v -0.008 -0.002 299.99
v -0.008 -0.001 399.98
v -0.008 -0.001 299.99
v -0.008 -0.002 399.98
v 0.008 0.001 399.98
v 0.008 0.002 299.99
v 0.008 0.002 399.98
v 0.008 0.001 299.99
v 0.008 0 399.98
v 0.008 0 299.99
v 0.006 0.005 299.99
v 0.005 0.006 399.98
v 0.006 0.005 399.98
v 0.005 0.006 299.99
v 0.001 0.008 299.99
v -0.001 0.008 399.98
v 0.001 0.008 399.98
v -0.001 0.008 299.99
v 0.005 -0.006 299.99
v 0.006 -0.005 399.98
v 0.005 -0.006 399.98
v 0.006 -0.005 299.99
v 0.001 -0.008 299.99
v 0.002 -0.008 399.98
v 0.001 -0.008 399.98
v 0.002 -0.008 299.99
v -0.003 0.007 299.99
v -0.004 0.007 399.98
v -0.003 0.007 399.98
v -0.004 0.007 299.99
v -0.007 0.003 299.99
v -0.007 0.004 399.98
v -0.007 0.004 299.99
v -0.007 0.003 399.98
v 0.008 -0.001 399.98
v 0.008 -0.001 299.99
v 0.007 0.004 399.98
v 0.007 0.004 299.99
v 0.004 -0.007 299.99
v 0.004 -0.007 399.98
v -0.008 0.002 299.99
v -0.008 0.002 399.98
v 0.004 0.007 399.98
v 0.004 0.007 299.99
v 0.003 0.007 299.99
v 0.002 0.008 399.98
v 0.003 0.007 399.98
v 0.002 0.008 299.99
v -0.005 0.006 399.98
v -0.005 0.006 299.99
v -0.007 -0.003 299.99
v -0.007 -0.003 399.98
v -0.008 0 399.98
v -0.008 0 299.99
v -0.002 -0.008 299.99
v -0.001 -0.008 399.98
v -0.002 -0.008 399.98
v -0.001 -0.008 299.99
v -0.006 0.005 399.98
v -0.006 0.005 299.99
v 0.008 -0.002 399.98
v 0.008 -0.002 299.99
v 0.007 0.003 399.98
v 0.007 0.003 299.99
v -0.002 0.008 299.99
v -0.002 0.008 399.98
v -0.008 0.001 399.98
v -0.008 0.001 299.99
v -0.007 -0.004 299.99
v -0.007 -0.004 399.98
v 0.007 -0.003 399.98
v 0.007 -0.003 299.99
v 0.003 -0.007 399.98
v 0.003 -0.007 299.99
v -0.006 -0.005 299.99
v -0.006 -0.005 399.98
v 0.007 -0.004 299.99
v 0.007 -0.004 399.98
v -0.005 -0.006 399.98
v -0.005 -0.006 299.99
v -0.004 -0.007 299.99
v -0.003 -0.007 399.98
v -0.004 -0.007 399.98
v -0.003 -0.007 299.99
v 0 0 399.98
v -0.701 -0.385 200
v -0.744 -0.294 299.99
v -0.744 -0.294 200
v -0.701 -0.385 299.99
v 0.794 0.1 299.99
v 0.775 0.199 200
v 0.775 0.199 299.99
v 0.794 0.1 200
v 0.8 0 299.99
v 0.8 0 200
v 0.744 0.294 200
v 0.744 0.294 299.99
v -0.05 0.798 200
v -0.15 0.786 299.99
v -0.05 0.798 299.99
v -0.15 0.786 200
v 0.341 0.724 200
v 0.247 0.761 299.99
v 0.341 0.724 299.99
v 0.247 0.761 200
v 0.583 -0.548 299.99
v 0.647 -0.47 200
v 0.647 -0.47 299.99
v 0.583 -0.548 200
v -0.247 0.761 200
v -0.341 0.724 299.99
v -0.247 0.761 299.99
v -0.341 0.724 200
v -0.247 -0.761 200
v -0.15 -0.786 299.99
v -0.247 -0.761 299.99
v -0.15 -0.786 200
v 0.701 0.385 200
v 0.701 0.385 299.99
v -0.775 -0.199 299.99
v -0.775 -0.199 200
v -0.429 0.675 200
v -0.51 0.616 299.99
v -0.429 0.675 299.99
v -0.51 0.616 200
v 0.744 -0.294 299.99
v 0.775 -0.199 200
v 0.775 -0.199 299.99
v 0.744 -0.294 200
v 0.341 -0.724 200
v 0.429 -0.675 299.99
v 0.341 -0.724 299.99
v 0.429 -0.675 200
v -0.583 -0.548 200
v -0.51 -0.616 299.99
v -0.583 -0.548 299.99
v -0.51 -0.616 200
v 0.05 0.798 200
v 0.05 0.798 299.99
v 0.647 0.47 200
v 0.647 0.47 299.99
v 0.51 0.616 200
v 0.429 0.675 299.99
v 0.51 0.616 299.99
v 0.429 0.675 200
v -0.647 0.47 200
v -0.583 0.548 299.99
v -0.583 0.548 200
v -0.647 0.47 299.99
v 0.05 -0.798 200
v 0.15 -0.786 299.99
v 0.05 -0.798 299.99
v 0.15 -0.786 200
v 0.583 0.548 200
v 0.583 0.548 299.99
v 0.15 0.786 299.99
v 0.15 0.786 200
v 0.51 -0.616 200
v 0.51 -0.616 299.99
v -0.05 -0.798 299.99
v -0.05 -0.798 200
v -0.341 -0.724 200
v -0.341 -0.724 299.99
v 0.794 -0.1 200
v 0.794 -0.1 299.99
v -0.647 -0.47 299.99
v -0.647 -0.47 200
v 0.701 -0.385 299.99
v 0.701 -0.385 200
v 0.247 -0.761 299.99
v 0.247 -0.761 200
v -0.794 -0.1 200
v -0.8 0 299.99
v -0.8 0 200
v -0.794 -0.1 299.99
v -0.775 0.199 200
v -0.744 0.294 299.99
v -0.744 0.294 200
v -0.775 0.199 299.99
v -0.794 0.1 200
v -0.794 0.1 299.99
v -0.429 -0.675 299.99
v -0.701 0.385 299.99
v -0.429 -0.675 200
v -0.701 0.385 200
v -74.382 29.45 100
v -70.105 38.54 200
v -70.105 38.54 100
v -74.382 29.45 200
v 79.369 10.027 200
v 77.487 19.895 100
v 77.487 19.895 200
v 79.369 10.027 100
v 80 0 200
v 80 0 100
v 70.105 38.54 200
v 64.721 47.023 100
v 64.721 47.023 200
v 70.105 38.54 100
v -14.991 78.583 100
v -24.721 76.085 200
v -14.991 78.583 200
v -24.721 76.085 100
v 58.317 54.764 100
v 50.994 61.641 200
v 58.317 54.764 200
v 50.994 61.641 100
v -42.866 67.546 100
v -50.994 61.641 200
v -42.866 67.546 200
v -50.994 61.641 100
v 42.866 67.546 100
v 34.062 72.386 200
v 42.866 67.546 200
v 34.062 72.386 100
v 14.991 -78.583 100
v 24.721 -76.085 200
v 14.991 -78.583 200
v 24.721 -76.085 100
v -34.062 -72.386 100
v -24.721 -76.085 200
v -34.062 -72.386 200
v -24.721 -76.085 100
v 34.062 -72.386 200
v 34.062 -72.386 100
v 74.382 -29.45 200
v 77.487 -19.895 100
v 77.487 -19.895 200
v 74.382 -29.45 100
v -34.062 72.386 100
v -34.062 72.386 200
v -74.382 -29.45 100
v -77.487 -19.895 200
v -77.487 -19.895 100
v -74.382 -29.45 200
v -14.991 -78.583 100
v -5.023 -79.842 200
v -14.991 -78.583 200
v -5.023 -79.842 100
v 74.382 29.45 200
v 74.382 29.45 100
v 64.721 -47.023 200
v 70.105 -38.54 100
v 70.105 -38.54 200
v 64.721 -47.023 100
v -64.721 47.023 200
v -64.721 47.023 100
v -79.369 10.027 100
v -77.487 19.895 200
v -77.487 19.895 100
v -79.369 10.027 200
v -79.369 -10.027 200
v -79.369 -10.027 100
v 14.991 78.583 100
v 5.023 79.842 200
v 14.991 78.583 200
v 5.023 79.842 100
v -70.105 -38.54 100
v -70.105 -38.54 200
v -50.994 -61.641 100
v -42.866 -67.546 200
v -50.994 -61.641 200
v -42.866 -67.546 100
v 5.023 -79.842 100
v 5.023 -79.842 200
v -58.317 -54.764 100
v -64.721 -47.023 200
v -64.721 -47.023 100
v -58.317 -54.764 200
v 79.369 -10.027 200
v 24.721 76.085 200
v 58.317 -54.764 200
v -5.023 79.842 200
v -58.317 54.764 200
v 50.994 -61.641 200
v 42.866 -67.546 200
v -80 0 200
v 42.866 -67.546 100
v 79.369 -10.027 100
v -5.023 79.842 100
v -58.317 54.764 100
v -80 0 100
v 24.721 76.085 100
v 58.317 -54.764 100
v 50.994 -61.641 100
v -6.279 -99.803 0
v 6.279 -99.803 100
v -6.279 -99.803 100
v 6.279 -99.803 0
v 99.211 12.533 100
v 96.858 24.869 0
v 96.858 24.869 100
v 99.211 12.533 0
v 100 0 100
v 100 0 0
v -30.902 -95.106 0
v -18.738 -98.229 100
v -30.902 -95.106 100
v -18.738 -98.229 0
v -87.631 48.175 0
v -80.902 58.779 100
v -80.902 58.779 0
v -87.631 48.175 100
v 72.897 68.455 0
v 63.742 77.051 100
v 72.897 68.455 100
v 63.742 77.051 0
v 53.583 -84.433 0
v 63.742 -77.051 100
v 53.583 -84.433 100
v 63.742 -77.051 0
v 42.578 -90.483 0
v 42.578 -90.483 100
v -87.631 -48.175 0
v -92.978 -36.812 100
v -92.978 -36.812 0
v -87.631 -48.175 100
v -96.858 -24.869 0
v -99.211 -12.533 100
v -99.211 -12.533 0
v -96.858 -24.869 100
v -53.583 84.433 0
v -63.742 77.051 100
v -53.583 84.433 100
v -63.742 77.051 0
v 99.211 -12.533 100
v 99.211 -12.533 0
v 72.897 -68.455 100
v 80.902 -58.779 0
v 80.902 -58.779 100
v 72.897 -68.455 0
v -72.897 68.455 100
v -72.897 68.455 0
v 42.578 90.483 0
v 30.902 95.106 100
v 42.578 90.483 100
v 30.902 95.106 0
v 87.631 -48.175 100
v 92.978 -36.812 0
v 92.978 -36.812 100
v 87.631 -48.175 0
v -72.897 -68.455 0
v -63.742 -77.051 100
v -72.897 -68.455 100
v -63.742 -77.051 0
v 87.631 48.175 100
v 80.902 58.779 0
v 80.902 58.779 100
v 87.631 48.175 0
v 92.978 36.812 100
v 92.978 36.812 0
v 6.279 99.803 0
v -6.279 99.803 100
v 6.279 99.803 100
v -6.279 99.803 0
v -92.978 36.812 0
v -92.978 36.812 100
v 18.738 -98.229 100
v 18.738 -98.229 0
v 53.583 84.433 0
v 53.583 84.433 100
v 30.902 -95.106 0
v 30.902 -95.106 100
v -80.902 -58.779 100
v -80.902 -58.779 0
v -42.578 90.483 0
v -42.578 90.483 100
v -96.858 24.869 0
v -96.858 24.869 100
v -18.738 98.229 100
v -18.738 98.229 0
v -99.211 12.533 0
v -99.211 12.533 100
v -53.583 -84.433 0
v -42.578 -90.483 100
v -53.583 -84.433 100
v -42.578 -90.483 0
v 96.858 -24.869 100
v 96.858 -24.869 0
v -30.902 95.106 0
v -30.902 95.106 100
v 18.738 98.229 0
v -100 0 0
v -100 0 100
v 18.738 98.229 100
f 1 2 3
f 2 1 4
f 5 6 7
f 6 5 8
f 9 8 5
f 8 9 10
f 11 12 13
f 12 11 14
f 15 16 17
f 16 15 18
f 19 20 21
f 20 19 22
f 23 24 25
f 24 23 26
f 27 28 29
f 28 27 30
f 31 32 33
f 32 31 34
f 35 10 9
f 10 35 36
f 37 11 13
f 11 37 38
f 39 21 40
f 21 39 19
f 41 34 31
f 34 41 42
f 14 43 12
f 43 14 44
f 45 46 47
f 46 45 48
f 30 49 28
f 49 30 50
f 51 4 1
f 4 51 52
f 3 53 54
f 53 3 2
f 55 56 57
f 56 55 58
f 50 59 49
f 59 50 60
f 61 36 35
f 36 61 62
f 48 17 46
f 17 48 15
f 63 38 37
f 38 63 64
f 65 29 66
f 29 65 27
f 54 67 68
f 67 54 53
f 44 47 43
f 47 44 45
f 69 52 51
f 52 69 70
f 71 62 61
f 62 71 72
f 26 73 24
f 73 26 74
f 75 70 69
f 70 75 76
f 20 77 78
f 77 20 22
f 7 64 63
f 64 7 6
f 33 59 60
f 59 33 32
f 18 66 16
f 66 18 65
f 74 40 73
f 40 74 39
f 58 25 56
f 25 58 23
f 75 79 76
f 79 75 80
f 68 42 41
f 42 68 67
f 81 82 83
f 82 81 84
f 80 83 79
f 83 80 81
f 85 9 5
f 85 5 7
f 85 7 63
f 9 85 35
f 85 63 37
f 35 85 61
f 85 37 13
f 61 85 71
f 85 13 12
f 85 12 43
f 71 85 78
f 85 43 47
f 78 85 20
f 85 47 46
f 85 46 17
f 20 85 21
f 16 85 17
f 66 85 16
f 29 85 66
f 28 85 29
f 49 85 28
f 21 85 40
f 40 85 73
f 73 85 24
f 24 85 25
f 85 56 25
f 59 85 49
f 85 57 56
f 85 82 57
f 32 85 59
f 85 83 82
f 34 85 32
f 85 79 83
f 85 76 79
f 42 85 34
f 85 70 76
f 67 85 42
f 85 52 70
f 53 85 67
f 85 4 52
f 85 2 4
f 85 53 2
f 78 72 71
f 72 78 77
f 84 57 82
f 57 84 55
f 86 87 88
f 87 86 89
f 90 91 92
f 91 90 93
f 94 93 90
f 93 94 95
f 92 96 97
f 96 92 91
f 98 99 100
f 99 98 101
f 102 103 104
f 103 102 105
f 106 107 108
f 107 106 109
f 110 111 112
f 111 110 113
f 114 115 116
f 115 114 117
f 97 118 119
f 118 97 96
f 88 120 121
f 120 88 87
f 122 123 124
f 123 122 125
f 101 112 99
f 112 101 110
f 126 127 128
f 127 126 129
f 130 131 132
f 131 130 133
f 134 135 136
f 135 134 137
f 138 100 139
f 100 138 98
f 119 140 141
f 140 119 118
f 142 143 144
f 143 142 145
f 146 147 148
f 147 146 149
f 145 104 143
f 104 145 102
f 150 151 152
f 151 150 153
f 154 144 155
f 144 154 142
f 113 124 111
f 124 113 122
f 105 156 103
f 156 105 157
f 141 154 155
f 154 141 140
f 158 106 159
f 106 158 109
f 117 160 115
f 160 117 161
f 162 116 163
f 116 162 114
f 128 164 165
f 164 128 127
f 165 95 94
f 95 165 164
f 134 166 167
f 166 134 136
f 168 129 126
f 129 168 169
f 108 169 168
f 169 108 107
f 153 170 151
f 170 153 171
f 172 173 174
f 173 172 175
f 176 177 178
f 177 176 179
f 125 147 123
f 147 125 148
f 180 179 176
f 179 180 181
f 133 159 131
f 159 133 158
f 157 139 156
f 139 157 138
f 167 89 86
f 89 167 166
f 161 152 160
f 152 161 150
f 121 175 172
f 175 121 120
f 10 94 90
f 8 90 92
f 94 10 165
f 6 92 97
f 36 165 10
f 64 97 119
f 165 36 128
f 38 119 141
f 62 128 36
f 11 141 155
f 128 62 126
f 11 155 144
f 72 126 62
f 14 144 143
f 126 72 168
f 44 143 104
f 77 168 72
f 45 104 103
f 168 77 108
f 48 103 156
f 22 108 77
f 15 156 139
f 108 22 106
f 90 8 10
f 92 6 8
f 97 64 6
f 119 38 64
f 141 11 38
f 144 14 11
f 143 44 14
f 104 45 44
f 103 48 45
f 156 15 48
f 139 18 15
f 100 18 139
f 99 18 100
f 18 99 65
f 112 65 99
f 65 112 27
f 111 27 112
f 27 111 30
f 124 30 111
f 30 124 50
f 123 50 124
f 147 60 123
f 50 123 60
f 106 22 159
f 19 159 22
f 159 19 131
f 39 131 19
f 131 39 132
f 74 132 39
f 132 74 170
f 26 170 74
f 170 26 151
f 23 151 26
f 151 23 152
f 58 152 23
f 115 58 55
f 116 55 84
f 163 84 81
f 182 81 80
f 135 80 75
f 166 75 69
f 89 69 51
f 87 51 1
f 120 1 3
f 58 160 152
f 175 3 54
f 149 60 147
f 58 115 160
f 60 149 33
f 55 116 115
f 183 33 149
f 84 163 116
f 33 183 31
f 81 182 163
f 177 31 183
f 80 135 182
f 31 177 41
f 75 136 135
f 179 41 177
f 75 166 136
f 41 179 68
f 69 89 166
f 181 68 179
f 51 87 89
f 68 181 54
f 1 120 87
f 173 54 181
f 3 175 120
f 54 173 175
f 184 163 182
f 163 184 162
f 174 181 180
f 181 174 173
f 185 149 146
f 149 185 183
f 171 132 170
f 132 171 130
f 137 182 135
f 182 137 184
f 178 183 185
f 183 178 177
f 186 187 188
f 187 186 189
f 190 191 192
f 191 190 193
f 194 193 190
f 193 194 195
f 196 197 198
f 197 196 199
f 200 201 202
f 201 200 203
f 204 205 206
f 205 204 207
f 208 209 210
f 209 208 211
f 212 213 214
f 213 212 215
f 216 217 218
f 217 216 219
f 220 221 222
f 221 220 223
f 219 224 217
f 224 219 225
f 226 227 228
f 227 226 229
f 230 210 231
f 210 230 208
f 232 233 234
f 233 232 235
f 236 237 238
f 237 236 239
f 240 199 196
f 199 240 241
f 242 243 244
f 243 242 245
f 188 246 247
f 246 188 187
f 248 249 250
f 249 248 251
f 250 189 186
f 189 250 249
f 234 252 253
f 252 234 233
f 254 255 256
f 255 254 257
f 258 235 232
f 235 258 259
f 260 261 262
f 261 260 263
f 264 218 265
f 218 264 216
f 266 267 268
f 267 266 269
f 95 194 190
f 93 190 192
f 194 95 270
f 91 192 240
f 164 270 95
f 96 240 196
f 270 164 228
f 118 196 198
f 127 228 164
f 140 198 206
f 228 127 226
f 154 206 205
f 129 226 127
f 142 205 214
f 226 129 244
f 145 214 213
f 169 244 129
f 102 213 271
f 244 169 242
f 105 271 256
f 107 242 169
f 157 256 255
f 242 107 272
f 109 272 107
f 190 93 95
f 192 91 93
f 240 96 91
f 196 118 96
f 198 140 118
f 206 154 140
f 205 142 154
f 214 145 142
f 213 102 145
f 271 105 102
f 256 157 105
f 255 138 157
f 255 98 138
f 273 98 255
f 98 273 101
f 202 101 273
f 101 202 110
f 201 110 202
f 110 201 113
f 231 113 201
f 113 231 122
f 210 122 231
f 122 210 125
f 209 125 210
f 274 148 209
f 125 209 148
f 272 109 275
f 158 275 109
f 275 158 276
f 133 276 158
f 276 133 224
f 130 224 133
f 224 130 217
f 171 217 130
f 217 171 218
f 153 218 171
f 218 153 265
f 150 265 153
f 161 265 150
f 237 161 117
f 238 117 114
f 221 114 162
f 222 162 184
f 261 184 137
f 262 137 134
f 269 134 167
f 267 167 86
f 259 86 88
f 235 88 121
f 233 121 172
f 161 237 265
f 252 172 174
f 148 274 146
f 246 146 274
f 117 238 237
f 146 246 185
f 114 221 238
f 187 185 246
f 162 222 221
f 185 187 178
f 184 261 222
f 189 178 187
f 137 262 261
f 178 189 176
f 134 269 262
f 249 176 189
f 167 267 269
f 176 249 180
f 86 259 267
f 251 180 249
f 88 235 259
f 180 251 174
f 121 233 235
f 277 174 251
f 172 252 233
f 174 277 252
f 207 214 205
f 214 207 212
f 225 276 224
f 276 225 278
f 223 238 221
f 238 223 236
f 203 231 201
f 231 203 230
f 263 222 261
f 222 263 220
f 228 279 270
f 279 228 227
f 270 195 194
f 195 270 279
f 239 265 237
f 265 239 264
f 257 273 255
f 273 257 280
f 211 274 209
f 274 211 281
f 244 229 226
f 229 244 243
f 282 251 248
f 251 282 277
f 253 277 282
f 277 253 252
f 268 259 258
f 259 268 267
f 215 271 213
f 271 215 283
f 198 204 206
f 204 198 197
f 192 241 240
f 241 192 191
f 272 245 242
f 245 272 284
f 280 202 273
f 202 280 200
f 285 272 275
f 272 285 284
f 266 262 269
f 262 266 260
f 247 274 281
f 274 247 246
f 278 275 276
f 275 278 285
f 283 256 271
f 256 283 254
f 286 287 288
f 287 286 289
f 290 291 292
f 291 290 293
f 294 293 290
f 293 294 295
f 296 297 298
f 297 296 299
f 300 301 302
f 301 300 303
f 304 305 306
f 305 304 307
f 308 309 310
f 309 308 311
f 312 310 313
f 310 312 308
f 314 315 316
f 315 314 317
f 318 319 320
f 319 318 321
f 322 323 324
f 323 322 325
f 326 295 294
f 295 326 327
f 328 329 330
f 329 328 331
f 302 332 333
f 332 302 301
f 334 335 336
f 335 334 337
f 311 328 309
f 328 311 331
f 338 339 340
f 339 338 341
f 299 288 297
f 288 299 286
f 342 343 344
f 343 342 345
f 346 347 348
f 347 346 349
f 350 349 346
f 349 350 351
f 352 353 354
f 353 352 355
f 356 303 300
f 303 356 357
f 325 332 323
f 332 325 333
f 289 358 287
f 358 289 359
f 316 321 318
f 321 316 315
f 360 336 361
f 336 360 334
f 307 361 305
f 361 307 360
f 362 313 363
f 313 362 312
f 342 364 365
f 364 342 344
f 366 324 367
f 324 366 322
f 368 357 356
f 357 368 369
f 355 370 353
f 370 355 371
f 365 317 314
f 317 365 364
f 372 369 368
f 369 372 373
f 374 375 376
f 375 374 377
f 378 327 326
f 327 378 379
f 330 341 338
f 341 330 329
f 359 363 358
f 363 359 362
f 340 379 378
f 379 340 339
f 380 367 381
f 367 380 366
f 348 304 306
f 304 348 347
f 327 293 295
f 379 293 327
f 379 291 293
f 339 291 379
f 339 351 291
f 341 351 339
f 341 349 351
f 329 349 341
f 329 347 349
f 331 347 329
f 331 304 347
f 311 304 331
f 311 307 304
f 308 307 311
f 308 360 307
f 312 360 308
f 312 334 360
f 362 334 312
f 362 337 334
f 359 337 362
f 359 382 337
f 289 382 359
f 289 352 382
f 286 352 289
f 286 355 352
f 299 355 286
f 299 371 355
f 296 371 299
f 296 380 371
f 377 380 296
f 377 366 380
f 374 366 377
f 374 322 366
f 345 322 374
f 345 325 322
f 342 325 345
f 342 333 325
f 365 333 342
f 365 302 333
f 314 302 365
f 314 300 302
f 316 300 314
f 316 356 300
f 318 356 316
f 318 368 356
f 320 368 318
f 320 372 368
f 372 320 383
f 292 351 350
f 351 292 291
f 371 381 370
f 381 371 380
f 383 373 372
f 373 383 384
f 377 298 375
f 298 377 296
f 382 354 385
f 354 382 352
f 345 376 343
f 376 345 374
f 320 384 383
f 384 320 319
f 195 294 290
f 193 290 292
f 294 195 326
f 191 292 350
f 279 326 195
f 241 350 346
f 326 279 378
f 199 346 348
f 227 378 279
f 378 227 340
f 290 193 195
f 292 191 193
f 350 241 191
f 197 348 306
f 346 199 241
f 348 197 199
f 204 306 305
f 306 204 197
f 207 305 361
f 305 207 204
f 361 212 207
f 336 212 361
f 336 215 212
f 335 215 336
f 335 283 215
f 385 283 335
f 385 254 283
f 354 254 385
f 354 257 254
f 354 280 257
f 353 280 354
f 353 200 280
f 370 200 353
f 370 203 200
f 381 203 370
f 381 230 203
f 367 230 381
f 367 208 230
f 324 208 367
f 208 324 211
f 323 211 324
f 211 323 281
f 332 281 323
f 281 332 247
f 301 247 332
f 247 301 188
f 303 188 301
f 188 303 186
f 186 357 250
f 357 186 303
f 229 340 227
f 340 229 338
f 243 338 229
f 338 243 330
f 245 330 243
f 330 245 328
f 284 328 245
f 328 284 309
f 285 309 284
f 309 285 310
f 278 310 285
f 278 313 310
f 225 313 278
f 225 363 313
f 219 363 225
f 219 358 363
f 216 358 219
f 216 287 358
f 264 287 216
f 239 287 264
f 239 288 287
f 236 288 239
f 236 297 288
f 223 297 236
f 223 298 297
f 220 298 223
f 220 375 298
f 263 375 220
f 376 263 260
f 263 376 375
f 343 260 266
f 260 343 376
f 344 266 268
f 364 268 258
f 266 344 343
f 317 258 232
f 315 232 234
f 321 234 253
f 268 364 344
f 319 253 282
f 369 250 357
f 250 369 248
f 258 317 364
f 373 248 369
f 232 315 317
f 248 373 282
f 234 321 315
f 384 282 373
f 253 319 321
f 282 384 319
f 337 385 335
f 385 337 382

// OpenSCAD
// levels: number of levels of the tower
// base_radius: radius of the first cylinder, decreases by a factor of Factor
// layer_height: height of a single layer
// _eps and _is_internal are reserved for internal logic. Do not override.
module telescoping_tower(levels, base_radius, layer_height, factor, _eps = 0.01, _is_internal = false) {
    // 1. Validation only happens at the public entry point
    if (!_is_internal) {
        assert(levels > 0&&base_radius>0&&layer_height>0&&factor>0, "All parameters must be positive");
        assert(floor(levels) == levels, "Levels must be an integer");
        assert(factor < 1, "Factor must be less than 1");
    }

    if (levels > 0) {
        // Adjust height ONLY if we are not the very first base layer
        _h_adj = _is_internal ? _eps : 0;
        
        // Render current layer
        cylinder(r = base_radius, h = layer_height + _h_adj, $fn = 50);

        // Move to the top of the CURRENT layer (pure height), then sink back by eps
        translate([0, 0, layer_height])
        translate([0, 0, -_eps])
            telescoping_tower(levels - 1, base_radius * factor, layer_height, _eps, _is_internal = true);
    }
}

telescoping_tower(10, 100, 100, factor=0.8);
